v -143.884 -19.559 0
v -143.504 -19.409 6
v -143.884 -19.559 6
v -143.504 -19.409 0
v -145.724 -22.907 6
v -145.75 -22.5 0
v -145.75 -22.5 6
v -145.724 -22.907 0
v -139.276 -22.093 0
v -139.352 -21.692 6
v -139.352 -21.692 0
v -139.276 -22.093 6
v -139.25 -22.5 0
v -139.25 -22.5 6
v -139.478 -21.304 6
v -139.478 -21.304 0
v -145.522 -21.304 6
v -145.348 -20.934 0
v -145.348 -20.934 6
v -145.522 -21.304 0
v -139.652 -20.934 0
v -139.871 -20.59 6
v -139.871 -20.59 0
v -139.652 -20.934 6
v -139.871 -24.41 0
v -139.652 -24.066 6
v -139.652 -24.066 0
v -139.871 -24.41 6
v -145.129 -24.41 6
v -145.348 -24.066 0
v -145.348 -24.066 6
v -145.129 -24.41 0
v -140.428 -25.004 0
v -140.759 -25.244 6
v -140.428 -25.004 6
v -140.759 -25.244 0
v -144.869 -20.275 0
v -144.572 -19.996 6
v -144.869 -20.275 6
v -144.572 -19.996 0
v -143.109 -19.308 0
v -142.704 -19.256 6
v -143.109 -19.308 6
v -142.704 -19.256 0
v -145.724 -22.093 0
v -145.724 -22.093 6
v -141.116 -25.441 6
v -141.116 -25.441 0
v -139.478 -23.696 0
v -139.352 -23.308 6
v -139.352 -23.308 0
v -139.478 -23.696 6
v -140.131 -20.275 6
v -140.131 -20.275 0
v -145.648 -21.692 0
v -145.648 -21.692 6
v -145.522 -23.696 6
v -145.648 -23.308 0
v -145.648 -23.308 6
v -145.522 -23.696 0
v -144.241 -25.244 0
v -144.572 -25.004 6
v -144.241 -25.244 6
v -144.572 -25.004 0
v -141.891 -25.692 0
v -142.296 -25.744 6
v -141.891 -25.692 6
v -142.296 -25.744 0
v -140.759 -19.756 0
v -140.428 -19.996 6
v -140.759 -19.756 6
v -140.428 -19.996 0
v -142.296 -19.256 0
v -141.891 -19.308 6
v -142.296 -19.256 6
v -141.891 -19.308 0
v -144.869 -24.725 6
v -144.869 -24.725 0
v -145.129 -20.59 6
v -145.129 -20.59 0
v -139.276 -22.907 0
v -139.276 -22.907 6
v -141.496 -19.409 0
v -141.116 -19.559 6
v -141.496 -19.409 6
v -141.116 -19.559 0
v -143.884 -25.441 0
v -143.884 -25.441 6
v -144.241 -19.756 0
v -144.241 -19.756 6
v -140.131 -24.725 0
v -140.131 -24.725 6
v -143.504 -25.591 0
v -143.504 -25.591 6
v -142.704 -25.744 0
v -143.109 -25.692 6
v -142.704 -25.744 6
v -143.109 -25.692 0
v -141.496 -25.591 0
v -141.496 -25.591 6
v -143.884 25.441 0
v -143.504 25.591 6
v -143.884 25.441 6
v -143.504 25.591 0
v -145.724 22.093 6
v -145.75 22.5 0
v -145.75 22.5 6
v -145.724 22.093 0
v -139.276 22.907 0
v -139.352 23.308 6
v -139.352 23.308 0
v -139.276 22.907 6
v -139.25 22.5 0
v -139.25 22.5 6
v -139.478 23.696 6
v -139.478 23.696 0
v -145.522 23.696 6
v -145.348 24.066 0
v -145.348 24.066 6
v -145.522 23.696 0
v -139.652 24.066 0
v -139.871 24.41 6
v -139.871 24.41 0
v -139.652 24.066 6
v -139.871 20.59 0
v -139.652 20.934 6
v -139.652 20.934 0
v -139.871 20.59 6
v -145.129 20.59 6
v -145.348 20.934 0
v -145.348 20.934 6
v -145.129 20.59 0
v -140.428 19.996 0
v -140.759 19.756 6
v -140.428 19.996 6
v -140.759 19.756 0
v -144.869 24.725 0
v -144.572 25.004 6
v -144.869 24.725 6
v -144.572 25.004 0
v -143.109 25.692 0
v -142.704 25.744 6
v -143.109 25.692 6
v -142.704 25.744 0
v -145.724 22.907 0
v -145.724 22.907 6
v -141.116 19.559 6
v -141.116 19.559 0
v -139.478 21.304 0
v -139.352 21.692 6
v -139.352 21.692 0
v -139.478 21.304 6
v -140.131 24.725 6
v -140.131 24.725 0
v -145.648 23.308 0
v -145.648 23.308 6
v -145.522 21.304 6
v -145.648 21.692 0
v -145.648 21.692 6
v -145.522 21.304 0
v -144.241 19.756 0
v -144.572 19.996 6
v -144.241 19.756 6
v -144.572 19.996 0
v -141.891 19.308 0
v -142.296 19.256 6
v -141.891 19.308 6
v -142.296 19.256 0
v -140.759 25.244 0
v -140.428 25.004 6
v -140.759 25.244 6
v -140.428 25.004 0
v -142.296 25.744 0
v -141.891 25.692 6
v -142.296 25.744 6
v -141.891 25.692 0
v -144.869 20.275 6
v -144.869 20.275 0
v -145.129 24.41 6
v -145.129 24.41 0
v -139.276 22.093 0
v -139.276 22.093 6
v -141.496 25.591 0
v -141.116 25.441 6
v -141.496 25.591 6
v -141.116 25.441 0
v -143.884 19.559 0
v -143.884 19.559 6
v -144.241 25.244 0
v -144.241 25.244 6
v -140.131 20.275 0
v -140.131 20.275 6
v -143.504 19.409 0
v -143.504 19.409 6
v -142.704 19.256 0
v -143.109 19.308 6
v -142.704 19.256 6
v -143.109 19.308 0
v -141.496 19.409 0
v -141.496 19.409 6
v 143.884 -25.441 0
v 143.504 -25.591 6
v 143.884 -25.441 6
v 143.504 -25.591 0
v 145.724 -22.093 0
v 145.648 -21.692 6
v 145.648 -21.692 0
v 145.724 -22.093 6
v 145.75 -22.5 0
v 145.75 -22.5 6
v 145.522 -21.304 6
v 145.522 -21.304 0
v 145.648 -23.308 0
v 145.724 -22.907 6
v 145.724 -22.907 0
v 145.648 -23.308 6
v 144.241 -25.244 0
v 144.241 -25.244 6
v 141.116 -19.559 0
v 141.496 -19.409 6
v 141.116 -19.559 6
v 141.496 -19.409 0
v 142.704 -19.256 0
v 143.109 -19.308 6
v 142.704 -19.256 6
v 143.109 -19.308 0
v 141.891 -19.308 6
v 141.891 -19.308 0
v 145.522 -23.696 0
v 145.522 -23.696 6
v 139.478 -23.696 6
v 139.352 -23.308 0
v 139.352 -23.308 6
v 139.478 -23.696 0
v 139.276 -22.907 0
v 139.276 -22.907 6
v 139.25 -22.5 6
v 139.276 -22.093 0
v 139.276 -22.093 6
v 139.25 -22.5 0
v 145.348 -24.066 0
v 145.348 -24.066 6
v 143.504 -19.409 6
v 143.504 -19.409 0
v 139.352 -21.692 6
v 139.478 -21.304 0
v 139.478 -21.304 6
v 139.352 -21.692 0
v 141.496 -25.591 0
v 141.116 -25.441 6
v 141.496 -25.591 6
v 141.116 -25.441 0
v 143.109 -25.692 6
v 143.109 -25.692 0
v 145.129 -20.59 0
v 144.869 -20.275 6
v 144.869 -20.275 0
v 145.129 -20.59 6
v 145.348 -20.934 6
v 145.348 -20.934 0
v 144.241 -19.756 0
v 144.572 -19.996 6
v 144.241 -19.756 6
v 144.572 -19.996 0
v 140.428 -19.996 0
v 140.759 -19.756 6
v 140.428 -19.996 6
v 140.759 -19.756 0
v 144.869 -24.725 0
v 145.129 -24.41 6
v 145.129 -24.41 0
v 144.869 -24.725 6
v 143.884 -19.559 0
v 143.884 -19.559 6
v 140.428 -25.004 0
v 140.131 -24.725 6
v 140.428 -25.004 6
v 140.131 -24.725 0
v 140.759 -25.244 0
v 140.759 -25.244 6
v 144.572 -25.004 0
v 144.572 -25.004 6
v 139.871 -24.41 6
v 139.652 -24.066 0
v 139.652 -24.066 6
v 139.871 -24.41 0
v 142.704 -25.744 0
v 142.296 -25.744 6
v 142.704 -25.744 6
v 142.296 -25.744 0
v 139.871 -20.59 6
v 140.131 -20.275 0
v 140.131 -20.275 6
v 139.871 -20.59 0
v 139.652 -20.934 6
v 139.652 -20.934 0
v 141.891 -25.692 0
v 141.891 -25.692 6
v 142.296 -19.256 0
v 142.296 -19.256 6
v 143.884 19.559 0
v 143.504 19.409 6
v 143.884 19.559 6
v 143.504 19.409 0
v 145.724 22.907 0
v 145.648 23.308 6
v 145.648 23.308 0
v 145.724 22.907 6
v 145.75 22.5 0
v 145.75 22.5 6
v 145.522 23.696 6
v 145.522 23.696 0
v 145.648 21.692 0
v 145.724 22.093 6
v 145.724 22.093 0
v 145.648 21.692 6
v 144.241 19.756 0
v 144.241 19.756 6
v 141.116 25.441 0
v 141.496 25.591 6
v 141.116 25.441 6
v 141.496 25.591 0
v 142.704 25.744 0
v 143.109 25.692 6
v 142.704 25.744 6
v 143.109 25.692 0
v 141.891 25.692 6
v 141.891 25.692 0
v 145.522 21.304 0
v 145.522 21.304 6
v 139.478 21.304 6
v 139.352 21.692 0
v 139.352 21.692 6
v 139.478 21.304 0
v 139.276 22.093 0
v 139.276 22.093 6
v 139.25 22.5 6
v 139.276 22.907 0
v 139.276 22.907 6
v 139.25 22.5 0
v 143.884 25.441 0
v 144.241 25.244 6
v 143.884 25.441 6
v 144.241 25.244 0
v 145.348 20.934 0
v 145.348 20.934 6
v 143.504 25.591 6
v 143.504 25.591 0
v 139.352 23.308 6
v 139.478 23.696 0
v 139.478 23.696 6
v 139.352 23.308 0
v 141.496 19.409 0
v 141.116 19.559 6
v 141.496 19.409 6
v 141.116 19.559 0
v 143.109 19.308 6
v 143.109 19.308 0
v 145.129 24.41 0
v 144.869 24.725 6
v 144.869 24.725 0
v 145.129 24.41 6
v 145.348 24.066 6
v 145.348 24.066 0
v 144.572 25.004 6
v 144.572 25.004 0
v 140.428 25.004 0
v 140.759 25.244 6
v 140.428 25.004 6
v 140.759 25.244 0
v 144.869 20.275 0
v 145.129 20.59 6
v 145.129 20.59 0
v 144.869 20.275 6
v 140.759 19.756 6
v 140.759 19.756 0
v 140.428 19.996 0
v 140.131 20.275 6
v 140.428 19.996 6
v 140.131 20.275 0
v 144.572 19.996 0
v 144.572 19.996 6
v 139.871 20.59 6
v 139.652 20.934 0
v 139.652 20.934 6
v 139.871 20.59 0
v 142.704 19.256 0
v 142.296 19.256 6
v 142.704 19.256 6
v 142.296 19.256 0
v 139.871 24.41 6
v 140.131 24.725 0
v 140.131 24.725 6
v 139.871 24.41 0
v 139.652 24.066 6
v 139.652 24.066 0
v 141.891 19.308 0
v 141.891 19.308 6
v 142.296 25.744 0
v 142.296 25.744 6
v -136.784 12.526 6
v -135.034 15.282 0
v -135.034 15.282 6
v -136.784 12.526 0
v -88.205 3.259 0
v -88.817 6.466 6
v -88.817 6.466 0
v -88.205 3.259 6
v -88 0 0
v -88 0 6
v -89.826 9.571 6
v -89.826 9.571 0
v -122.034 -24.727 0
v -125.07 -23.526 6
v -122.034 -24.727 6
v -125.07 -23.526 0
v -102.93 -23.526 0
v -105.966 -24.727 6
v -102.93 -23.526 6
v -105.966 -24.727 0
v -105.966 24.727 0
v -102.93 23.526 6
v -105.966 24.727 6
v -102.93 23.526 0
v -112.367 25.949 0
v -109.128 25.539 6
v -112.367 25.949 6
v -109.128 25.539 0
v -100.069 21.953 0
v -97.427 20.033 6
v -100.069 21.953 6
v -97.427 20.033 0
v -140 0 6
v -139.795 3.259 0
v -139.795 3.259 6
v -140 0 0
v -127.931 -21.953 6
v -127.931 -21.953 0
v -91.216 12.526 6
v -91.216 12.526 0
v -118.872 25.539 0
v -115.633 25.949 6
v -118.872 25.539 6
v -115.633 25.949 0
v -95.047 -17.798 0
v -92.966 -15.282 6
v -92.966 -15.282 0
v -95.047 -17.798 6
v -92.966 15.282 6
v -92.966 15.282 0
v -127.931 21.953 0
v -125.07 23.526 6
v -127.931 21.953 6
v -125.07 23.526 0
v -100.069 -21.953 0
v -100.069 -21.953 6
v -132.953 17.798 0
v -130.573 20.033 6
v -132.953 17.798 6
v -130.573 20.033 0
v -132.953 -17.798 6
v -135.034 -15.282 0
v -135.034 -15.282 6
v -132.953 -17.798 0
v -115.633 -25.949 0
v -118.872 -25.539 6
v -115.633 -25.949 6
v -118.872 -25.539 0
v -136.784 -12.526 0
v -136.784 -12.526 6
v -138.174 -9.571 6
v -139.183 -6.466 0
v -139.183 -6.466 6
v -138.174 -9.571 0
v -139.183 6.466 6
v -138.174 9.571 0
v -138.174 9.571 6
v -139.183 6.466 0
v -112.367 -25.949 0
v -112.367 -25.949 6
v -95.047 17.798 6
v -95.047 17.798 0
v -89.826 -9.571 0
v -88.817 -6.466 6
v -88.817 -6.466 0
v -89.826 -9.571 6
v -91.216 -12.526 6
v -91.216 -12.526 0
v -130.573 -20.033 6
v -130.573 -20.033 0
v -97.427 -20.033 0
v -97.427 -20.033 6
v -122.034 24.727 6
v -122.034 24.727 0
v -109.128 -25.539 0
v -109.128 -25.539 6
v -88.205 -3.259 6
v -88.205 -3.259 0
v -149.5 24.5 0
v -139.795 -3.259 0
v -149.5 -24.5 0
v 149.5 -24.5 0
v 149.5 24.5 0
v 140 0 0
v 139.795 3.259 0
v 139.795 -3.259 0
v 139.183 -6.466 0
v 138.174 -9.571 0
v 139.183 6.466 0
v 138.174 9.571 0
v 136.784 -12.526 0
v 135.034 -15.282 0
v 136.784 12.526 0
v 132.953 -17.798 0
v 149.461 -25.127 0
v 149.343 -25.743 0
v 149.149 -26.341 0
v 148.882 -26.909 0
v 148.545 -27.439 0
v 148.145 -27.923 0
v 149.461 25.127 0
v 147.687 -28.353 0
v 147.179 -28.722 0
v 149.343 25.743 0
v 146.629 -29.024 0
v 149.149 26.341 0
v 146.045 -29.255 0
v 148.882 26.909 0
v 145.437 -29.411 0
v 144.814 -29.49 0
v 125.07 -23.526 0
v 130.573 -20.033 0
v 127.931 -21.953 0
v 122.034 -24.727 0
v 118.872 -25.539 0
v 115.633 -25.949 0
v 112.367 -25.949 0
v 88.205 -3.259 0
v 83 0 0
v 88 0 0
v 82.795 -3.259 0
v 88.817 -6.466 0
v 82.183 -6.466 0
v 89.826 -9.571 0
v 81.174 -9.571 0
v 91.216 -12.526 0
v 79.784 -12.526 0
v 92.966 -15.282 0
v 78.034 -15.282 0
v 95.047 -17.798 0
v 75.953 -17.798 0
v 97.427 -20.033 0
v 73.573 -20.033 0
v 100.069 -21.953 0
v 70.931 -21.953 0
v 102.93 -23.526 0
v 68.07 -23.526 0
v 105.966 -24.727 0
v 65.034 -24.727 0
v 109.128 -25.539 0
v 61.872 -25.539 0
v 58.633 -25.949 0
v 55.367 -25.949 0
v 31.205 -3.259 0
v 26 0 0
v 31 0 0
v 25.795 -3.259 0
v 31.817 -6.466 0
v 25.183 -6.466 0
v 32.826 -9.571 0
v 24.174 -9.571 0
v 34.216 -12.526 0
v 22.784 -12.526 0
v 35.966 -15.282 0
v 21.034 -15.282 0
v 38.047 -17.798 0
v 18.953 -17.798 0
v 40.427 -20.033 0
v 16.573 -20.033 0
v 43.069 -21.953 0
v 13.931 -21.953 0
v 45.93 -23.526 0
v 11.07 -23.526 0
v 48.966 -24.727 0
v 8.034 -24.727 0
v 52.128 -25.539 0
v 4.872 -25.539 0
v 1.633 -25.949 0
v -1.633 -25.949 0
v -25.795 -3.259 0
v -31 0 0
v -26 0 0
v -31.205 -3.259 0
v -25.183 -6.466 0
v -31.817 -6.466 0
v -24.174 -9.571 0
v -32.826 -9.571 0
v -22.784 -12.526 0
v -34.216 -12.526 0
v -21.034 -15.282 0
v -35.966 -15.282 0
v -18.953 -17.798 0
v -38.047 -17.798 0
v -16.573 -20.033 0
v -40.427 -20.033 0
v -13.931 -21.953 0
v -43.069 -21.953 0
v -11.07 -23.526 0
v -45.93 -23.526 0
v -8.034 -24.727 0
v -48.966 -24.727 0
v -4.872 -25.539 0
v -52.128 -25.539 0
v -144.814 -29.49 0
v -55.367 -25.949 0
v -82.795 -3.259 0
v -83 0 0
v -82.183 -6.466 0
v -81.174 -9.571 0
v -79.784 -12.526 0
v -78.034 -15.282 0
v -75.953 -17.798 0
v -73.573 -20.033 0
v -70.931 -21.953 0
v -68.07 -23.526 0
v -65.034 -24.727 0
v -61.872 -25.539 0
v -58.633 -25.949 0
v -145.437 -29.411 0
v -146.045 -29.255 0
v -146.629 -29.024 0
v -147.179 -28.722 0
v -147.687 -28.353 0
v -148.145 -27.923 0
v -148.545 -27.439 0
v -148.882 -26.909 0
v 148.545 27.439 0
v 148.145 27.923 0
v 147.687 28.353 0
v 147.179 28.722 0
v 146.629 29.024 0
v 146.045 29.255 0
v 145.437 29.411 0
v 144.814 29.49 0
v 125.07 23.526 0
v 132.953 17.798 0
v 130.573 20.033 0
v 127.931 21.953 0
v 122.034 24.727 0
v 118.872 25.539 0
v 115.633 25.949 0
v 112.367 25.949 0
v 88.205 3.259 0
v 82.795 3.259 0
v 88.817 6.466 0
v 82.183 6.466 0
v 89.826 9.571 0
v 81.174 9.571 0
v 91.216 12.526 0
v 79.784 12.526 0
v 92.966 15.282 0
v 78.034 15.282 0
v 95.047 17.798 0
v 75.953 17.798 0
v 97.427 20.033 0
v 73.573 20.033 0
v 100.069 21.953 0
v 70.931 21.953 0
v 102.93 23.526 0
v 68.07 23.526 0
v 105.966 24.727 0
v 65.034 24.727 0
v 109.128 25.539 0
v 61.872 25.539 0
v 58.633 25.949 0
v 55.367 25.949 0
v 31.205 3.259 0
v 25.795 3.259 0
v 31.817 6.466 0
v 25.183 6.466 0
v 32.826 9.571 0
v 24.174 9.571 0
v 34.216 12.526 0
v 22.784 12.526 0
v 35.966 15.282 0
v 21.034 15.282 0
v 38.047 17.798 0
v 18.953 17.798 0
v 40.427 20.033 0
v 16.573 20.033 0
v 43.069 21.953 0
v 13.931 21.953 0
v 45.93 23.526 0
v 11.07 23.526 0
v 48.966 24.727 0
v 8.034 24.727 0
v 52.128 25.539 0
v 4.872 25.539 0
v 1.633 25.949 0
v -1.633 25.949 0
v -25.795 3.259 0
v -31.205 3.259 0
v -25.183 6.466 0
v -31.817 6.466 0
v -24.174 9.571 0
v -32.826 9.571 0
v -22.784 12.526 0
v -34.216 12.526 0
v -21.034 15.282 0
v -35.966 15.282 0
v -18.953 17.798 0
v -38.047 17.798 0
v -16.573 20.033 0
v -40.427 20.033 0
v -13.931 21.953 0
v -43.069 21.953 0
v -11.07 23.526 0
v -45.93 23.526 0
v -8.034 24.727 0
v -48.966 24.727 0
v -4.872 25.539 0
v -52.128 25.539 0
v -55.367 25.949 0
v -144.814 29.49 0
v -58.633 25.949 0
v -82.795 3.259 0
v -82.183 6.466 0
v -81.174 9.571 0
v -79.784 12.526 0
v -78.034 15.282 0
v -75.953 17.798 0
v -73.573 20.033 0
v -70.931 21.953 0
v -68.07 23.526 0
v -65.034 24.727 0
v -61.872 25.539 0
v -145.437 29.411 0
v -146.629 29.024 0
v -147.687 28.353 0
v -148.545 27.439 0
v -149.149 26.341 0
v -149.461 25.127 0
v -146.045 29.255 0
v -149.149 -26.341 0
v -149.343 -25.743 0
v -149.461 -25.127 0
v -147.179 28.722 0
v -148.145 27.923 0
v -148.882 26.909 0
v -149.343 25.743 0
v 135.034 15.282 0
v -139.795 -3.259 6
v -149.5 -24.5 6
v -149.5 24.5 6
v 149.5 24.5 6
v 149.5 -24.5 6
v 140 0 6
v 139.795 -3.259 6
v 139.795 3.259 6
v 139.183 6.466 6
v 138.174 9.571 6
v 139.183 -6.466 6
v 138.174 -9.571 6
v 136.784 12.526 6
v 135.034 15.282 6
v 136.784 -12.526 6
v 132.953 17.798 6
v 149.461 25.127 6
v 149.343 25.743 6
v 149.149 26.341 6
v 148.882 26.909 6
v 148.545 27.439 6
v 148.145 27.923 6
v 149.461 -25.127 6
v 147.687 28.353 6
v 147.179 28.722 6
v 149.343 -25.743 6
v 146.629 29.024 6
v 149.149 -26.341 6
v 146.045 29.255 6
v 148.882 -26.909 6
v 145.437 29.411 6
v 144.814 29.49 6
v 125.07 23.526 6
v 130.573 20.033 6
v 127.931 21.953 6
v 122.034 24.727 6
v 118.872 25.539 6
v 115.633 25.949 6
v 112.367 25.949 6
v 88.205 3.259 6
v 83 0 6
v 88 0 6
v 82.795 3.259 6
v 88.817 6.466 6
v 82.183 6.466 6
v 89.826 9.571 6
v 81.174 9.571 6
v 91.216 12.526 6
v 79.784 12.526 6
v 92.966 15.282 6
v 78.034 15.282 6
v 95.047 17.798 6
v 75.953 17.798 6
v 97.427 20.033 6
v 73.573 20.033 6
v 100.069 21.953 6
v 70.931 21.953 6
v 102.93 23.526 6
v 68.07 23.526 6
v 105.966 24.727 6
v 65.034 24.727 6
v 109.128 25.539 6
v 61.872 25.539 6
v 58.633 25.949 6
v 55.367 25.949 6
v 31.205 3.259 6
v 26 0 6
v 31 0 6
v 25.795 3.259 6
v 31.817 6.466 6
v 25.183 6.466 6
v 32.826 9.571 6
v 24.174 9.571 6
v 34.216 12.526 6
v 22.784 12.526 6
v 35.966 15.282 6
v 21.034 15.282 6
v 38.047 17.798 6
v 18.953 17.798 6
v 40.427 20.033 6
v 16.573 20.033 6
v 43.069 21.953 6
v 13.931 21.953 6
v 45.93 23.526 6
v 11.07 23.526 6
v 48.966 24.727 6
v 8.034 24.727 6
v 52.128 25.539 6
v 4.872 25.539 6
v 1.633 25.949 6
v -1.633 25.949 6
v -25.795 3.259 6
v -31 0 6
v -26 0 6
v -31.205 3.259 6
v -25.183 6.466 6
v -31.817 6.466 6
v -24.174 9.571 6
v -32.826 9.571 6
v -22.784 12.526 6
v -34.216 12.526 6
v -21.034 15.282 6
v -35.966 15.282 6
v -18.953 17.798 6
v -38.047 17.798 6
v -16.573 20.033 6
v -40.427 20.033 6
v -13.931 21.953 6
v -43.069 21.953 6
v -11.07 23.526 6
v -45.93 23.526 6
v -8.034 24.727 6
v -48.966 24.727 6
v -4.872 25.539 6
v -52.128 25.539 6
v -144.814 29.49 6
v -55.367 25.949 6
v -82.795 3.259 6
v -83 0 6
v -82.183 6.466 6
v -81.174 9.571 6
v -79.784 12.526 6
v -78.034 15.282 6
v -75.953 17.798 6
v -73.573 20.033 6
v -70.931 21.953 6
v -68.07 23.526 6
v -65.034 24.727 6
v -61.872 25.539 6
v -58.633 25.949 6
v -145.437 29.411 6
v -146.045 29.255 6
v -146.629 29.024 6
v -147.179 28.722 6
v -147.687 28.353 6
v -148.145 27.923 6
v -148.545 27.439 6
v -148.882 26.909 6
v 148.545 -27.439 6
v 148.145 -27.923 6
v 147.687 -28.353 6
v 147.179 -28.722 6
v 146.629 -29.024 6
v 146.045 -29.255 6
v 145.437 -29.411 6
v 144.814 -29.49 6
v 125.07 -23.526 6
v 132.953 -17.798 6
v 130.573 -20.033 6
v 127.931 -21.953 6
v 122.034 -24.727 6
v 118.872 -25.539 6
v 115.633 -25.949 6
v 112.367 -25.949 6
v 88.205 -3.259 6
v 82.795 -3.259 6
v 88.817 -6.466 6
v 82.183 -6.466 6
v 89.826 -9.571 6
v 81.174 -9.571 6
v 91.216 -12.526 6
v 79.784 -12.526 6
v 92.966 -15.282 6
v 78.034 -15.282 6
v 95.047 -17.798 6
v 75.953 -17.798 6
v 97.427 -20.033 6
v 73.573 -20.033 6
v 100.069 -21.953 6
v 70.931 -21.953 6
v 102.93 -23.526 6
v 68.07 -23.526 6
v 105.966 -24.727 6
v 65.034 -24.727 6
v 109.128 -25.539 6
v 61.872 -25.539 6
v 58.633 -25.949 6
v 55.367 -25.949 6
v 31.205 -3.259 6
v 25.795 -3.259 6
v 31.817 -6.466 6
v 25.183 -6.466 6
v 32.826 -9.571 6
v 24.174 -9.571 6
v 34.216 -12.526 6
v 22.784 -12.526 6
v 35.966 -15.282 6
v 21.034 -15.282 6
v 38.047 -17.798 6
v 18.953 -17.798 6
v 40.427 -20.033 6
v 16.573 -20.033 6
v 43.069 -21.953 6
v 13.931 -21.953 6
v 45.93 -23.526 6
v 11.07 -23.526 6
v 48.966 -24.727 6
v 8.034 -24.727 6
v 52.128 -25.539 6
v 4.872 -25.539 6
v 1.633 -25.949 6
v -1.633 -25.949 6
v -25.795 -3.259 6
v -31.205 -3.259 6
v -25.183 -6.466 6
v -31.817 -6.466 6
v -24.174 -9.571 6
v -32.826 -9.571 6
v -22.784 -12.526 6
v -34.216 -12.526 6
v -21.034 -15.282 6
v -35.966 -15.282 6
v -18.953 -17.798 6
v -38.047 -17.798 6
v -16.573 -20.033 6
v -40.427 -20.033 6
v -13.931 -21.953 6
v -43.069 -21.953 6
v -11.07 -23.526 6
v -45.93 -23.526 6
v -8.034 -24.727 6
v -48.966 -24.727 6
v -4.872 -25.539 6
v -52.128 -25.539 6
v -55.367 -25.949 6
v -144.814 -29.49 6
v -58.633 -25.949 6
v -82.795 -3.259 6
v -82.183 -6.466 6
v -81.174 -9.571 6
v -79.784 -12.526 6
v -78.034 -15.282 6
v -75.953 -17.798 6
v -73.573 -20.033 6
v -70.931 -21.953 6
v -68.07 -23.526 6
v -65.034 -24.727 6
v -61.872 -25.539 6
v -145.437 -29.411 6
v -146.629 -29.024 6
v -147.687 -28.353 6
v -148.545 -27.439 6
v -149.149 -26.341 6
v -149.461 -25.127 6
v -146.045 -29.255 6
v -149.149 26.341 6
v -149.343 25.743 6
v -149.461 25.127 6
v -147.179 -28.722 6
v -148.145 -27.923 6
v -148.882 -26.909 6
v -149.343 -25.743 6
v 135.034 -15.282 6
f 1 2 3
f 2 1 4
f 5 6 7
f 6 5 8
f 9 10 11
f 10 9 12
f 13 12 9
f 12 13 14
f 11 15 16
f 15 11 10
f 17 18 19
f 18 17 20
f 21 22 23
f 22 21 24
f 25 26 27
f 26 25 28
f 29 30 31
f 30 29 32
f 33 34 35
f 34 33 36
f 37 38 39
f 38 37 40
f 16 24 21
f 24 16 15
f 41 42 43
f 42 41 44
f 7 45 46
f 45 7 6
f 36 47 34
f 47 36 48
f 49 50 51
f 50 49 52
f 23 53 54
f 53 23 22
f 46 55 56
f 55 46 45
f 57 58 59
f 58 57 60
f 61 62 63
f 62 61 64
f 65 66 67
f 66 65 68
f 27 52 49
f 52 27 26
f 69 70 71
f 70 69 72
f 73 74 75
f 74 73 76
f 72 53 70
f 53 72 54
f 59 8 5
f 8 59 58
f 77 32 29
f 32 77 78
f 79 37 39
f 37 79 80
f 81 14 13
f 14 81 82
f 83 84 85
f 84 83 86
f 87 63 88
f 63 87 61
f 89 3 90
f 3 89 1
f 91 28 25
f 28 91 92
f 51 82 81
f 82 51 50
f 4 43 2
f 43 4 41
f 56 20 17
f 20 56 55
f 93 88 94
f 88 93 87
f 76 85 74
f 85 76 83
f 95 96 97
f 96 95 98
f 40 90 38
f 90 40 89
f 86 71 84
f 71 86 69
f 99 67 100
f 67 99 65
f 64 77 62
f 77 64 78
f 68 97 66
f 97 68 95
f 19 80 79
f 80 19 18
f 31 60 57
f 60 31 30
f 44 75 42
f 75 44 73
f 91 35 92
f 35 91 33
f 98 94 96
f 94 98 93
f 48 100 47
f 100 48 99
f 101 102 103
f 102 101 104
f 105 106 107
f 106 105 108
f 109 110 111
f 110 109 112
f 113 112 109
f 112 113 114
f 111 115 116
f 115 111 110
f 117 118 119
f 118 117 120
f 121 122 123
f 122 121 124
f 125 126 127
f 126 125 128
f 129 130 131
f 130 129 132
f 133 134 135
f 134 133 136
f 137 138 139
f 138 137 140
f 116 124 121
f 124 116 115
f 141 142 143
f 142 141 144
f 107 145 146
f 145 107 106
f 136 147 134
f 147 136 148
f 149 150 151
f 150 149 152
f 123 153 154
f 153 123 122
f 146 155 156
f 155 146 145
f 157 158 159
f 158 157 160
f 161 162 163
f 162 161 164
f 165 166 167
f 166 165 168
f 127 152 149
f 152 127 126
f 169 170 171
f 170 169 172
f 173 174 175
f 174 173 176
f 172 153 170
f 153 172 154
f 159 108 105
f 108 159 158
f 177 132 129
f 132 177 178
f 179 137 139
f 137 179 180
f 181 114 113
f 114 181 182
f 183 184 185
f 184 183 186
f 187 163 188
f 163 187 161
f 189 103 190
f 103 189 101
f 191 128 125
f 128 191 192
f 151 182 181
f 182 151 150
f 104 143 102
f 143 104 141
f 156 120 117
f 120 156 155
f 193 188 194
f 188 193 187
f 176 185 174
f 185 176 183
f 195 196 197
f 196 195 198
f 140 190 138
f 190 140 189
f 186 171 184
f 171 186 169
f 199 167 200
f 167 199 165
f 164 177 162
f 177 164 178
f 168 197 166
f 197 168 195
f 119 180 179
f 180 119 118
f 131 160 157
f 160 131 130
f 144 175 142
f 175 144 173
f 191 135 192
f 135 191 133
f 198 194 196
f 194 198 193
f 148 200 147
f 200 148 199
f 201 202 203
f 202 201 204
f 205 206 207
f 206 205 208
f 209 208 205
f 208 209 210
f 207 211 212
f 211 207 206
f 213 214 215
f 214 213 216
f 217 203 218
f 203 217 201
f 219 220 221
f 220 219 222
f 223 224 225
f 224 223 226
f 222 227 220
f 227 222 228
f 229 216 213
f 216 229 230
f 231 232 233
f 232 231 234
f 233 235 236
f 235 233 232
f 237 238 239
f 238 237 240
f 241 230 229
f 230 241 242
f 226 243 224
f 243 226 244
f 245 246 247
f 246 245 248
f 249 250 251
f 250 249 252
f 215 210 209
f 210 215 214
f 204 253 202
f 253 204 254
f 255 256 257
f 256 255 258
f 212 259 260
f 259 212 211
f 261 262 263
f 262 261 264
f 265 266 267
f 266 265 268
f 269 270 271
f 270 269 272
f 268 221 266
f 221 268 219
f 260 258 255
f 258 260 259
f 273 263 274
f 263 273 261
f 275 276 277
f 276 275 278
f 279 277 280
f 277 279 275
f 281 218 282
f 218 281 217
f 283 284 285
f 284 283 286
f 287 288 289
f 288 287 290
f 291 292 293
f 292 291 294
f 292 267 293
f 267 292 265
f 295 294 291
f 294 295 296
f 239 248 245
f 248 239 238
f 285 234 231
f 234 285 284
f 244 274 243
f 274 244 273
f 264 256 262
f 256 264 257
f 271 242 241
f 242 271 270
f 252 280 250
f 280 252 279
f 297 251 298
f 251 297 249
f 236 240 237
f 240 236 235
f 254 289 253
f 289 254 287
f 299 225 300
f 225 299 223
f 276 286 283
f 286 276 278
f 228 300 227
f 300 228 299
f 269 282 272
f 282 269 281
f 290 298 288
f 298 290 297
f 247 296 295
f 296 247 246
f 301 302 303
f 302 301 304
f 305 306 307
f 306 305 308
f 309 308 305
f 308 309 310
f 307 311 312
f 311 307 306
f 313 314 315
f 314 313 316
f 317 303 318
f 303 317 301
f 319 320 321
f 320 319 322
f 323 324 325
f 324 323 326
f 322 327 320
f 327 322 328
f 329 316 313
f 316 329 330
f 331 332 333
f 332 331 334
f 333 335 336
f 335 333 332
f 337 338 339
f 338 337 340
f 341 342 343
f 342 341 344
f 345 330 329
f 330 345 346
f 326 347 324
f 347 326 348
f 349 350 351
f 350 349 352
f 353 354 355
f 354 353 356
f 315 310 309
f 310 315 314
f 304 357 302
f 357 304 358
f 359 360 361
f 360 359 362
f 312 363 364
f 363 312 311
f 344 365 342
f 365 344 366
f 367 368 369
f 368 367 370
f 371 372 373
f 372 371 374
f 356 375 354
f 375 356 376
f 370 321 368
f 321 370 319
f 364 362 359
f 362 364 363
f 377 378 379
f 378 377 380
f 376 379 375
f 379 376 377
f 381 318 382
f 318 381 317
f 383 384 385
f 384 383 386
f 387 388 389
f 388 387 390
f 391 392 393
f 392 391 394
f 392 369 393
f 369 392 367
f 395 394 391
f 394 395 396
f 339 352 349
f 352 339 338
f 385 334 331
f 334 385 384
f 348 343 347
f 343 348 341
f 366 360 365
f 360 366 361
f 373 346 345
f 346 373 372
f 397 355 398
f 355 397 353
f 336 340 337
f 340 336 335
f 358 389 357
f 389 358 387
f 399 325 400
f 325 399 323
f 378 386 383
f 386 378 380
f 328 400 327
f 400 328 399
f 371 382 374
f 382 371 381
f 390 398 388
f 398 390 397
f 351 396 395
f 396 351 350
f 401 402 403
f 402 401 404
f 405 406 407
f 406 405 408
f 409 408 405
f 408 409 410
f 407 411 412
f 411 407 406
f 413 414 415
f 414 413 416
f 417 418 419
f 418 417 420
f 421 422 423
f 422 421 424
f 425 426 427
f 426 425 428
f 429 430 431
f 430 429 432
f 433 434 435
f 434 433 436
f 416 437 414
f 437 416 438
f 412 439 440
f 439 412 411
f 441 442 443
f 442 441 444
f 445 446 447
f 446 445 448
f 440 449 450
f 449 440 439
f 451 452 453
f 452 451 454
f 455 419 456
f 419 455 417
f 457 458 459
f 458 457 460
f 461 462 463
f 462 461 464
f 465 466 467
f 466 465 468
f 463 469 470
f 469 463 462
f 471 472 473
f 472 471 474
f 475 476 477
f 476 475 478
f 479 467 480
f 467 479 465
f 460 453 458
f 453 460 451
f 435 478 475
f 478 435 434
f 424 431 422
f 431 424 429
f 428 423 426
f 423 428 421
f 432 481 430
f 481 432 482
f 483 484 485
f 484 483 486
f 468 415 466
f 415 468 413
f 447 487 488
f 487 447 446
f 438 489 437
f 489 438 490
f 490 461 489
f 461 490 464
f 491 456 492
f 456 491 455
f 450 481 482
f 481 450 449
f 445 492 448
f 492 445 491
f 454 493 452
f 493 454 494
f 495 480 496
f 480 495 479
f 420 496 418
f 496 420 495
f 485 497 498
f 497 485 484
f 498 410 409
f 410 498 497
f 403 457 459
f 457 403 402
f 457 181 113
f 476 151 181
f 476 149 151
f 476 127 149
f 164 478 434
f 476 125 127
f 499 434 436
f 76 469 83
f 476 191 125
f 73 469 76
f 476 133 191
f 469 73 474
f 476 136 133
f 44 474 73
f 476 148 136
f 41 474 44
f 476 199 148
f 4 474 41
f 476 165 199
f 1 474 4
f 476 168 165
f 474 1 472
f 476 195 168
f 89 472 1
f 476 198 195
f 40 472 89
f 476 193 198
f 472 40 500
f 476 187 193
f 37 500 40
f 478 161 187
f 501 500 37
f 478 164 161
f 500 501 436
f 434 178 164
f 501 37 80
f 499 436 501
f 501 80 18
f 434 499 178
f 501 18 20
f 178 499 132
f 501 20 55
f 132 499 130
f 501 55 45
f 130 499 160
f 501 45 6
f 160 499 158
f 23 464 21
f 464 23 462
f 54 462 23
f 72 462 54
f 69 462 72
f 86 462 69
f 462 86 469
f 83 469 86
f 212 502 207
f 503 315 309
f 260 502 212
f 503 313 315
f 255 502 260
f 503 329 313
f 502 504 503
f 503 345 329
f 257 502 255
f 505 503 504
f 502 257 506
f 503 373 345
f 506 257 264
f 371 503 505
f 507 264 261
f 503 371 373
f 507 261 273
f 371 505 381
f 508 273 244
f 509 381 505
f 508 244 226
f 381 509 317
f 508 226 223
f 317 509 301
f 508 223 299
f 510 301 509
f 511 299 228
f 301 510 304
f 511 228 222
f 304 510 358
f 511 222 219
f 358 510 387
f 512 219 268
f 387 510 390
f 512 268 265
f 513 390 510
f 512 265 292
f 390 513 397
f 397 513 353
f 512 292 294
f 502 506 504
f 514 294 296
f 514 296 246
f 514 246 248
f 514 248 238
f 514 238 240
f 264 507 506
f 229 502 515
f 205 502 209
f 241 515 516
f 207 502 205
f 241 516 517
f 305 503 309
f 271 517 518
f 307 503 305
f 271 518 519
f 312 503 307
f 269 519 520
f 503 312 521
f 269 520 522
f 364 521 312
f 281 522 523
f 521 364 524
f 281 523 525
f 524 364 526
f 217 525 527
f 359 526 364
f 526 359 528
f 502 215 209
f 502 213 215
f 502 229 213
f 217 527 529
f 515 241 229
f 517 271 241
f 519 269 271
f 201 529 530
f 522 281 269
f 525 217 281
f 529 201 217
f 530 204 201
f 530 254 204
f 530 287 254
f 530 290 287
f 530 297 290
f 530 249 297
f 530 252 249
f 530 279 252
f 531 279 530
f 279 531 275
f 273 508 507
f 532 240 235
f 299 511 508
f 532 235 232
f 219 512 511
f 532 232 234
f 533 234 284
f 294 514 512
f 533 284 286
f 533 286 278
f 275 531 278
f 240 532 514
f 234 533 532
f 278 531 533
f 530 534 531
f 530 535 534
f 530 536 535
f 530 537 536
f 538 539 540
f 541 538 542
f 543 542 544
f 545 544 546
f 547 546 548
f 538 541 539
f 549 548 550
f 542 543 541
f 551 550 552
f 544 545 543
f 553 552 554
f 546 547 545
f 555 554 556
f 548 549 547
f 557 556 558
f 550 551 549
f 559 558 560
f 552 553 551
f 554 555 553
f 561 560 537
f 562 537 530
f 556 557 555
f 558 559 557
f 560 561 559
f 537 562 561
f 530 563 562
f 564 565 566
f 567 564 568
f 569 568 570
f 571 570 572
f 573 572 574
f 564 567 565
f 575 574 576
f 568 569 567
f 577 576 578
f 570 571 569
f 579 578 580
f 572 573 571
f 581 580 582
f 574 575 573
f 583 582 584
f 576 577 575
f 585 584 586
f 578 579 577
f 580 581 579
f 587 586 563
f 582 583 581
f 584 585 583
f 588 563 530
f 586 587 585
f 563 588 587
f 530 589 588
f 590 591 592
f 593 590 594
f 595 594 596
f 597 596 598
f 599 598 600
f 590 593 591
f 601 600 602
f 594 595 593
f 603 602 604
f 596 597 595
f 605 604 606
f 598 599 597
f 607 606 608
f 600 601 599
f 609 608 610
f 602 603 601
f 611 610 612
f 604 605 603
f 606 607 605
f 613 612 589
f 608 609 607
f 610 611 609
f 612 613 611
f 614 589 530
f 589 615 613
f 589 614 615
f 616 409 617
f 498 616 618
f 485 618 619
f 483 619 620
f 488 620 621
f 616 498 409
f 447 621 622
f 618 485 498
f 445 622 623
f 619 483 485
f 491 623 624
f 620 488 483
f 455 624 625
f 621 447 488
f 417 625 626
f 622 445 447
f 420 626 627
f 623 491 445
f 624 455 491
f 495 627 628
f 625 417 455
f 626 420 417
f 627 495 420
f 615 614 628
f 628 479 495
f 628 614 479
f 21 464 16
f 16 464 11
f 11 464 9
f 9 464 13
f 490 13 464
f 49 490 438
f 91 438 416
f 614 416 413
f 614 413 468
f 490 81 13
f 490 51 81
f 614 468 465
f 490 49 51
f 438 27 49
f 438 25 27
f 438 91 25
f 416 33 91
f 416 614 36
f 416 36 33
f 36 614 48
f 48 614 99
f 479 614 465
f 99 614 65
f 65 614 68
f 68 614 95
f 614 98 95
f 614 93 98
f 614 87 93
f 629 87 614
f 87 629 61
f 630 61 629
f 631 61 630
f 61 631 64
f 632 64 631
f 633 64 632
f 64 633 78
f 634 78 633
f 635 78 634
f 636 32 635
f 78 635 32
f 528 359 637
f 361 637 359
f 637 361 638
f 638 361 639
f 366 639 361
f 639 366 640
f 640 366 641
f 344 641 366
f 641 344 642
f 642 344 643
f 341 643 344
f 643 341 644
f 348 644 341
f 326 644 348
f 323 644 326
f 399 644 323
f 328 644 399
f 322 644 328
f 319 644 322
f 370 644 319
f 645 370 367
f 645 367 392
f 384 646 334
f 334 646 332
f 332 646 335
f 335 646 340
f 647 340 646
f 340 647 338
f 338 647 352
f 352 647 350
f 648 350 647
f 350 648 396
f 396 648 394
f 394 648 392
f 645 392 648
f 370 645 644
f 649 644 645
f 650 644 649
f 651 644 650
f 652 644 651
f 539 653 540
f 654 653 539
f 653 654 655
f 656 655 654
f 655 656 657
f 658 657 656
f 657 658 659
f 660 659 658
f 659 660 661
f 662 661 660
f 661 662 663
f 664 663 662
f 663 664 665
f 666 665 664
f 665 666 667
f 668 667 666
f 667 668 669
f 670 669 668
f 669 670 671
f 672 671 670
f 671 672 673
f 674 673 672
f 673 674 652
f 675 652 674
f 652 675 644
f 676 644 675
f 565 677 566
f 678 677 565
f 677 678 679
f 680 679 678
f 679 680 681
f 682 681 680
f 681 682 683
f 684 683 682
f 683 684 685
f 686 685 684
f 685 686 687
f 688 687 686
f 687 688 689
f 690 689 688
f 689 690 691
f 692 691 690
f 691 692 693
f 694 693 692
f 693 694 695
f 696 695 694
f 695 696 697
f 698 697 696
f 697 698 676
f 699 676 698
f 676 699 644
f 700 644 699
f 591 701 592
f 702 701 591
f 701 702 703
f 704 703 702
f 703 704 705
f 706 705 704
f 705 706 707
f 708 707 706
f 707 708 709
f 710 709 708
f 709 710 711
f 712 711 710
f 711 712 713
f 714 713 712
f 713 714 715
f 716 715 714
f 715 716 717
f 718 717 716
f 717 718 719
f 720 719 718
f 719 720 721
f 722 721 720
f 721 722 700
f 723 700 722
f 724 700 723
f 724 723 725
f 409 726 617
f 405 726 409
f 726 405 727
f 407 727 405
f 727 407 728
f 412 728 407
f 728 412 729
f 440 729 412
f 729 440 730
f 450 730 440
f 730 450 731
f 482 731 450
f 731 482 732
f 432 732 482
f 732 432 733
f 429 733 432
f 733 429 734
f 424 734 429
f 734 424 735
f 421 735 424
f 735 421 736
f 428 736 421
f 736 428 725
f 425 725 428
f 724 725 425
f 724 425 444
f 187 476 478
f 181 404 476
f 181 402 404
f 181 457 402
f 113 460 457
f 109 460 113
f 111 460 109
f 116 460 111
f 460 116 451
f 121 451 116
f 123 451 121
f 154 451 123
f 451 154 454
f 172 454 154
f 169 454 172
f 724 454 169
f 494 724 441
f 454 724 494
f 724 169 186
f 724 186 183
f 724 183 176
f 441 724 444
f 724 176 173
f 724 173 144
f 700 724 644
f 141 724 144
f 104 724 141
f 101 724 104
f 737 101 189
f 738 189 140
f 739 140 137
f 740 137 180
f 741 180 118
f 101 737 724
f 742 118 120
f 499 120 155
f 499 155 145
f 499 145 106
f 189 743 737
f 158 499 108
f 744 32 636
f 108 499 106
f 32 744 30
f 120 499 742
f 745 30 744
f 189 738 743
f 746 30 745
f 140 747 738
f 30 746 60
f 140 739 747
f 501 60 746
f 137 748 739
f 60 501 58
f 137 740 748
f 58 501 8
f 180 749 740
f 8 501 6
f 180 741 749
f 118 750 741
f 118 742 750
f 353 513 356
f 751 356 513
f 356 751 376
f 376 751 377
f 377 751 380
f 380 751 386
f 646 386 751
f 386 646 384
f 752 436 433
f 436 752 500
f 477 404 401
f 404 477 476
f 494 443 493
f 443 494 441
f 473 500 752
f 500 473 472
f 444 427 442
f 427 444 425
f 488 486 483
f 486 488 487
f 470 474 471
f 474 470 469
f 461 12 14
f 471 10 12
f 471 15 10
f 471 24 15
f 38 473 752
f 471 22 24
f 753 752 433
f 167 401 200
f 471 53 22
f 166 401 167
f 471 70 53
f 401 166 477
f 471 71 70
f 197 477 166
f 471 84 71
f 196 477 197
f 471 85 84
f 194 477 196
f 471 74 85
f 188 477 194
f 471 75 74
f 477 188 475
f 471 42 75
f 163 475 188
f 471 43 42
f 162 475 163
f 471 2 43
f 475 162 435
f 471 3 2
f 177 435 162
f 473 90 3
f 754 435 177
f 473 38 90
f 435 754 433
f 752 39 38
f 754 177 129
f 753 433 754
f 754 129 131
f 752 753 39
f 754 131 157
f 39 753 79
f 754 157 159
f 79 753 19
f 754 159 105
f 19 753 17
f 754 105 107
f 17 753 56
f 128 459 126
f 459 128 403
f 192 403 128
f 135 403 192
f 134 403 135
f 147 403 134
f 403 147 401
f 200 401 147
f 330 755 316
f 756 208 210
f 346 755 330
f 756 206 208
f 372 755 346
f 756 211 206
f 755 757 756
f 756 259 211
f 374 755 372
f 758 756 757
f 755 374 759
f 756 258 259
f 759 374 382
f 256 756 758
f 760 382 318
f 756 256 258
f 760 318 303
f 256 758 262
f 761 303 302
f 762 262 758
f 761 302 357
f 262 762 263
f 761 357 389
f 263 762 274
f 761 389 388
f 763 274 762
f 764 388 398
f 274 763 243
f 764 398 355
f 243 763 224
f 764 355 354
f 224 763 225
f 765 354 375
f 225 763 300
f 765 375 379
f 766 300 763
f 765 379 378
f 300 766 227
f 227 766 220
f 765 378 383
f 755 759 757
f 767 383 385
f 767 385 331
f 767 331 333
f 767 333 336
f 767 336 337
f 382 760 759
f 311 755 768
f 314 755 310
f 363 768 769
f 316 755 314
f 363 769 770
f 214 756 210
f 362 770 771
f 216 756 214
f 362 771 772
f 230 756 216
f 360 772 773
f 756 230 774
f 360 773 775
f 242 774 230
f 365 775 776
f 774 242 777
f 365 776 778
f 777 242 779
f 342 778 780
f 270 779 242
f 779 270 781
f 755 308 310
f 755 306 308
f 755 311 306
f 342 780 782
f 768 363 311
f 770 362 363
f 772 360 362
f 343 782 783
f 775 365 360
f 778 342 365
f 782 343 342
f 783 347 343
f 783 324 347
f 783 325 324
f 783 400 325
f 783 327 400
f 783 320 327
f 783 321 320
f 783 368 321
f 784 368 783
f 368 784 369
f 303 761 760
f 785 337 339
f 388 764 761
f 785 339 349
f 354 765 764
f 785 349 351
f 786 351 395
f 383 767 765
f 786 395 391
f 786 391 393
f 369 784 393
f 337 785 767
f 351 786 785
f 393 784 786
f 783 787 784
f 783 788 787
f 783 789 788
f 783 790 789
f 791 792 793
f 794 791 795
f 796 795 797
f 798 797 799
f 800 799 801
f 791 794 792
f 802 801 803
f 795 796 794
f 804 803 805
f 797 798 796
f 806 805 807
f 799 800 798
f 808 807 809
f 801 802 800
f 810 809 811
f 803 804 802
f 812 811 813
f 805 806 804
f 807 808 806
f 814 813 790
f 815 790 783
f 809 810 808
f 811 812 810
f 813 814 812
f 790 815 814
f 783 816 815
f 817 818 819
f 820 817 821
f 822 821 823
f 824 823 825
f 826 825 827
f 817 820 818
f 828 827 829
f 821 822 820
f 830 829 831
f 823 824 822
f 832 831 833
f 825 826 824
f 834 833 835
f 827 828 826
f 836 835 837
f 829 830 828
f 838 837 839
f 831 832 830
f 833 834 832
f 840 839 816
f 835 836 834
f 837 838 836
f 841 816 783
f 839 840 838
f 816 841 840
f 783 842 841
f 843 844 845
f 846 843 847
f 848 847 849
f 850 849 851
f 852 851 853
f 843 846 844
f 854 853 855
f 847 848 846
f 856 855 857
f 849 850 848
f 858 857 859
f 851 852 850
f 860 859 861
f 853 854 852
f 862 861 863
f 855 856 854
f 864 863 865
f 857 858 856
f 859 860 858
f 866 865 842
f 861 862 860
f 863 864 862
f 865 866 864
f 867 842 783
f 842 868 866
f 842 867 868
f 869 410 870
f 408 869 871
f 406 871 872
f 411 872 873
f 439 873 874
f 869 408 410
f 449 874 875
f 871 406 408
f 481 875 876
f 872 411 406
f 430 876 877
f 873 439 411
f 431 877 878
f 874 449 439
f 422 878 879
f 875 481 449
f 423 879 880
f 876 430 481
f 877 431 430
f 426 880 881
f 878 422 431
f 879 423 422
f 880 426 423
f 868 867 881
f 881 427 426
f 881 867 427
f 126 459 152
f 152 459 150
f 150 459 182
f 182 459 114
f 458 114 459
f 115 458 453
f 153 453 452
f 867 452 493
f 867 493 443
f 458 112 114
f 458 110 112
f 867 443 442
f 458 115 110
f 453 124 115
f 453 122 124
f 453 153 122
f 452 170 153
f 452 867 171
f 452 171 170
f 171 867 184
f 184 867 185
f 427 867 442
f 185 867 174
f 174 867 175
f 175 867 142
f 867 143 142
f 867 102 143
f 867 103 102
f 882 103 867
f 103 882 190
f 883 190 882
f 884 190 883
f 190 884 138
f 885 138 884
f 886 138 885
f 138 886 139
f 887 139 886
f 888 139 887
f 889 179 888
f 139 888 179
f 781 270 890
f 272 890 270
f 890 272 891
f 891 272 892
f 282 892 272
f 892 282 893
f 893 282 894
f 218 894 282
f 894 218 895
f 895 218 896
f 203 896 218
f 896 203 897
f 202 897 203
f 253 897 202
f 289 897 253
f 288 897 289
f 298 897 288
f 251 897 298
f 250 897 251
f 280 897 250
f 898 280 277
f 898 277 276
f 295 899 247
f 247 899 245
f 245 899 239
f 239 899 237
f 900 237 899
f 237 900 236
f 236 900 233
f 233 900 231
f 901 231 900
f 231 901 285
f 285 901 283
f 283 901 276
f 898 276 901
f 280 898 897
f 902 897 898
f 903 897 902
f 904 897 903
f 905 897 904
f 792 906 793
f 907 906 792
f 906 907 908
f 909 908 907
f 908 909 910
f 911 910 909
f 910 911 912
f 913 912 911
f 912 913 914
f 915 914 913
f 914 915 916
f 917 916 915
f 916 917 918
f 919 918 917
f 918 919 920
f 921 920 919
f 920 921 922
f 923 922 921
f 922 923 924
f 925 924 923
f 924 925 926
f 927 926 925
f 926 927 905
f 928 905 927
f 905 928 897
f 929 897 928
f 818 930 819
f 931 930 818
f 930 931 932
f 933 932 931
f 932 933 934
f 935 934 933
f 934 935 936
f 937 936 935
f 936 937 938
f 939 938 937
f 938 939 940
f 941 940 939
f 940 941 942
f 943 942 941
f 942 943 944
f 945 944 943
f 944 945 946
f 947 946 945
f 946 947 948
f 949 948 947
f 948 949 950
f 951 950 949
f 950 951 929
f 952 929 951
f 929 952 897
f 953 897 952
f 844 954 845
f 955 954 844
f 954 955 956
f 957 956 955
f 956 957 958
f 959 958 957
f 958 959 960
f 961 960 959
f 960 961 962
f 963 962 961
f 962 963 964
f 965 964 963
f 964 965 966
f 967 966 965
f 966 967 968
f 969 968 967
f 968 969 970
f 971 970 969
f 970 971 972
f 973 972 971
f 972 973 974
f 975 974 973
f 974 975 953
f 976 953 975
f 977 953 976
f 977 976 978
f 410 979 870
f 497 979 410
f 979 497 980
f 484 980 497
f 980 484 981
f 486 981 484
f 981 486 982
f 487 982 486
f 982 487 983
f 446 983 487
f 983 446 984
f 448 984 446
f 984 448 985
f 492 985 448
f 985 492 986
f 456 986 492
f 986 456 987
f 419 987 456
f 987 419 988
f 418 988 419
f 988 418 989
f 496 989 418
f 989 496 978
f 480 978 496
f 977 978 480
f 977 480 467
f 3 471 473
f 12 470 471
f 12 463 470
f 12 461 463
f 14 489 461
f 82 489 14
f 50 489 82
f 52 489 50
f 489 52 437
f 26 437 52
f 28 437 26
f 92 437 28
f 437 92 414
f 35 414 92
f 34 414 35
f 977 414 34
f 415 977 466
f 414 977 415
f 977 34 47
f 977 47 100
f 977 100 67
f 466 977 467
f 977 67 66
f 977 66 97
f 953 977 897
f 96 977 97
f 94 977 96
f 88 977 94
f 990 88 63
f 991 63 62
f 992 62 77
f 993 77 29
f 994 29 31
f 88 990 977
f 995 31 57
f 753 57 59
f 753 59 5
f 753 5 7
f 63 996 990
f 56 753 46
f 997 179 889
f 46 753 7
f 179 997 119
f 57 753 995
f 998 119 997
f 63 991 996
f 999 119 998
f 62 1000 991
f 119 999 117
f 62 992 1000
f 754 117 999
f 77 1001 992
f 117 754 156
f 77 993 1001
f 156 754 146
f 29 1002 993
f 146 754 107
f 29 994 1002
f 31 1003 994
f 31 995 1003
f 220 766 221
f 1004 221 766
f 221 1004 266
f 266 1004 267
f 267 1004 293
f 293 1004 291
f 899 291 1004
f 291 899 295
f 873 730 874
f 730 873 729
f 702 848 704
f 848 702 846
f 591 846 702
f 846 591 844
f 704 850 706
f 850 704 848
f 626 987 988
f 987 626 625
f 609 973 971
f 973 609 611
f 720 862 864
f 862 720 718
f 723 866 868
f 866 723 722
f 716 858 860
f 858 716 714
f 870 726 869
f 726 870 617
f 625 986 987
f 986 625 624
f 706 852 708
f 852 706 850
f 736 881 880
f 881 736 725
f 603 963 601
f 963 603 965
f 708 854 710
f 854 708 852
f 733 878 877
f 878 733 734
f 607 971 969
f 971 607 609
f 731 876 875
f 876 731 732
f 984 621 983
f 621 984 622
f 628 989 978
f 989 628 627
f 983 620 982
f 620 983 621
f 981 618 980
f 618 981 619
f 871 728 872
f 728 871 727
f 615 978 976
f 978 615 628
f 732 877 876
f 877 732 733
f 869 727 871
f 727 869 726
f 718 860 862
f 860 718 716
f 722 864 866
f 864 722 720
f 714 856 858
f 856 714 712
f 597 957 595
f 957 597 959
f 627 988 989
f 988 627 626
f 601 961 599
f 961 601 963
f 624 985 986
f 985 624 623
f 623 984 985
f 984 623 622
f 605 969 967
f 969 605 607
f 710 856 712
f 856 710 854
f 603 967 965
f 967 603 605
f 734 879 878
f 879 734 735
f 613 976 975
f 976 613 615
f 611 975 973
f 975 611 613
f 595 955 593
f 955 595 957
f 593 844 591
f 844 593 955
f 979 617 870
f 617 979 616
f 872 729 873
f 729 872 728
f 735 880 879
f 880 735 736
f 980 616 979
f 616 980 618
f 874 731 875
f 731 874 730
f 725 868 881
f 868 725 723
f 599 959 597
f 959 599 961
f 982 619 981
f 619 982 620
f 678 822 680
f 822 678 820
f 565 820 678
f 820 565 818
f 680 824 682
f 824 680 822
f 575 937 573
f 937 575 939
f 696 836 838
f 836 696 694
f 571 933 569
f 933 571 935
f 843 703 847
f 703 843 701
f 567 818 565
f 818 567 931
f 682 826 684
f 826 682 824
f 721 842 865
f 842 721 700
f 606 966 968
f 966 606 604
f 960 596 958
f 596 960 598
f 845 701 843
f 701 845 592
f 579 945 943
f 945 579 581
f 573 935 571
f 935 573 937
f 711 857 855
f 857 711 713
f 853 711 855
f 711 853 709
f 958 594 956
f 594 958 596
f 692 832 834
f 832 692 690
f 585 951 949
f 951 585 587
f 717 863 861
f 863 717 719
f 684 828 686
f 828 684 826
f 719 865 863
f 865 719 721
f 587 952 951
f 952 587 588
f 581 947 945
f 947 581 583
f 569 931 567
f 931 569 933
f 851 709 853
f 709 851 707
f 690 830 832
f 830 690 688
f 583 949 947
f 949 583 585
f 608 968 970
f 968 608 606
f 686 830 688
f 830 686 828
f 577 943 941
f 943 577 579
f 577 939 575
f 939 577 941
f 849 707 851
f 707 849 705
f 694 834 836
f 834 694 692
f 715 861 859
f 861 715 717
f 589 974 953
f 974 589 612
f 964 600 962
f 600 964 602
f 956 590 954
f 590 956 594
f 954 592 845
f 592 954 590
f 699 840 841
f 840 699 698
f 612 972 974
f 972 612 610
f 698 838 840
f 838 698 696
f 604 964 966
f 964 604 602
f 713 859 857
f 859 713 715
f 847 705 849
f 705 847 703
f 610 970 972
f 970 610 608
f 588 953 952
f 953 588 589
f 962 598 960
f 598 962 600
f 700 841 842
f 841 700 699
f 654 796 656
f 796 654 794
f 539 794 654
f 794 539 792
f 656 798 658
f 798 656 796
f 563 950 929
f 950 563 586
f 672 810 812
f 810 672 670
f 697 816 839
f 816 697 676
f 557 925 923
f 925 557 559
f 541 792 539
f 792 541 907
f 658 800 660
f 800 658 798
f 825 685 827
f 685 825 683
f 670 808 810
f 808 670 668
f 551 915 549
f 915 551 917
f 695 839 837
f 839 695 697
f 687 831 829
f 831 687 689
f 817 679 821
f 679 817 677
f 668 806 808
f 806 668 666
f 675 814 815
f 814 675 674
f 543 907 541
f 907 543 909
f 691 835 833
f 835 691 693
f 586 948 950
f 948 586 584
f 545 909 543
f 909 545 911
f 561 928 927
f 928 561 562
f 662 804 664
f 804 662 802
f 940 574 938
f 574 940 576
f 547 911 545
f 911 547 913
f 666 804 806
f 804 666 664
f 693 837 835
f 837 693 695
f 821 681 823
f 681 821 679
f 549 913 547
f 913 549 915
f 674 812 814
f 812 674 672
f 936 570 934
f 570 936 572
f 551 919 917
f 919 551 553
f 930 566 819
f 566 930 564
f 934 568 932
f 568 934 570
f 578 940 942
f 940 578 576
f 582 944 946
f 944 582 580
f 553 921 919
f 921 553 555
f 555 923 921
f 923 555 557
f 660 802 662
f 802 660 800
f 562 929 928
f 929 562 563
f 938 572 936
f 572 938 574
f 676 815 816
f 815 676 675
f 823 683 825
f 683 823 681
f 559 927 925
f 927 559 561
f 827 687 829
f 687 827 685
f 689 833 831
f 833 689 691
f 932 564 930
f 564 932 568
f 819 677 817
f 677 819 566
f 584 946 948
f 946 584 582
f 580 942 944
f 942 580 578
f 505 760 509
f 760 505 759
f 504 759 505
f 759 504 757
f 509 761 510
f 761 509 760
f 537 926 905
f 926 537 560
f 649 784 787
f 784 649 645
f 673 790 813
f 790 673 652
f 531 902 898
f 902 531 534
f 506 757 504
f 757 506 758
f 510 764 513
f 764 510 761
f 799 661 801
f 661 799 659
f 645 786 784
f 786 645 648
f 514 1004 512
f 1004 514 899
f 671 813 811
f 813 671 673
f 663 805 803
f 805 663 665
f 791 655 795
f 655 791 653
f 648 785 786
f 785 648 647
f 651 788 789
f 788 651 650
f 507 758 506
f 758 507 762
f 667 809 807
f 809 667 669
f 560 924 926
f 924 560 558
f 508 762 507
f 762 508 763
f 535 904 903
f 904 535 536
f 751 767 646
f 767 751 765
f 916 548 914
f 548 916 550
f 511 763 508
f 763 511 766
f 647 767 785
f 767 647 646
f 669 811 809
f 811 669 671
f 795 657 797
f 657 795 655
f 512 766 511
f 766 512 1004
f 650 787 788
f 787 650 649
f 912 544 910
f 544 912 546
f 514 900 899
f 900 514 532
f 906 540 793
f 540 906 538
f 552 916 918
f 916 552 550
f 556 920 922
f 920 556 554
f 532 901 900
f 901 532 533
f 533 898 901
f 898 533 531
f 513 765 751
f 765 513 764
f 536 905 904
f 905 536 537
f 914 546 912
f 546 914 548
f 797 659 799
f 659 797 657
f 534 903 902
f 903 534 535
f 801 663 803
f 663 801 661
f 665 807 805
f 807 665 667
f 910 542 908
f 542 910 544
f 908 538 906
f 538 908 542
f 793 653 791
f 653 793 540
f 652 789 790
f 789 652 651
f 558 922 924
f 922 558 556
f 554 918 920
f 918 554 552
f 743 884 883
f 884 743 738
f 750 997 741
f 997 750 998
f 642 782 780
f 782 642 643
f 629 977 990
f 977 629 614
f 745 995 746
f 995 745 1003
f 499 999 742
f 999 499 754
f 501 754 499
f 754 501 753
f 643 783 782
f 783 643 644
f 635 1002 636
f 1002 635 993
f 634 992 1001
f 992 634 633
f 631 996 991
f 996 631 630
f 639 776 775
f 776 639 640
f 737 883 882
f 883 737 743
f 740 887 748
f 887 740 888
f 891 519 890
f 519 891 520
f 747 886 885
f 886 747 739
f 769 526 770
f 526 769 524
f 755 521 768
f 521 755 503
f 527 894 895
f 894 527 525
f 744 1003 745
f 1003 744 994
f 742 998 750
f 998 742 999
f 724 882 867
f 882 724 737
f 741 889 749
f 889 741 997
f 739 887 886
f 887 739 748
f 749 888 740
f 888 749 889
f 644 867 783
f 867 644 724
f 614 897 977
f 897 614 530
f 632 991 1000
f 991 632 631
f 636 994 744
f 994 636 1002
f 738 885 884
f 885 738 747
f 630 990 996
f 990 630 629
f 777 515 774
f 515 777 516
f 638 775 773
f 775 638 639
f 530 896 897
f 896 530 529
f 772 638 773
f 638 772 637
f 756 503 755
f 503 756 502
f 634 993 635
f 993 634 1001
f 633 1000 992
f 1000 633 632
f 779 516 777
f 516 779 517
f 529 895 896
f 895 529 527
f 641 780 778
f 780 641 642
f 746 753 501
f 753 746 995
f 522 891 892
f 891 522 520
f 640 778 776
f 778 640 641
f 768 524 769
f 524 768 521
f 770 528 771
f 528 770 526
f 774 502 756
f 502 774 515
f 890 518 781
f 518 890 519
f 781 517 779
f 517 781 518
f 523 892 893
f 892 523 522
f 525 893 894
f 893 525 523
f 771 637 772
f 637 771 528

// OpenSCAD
$fn = 50;


difference() {
	union() {
		hull() {
			translate(v = [-144.5000000000, 24.5000000000, 0]) {
				cylinder(h = 6, r = 5);
			}
			translate(v = [144.5000000000, 24.5000000000, 0]) {
				cylinder(h = 6, r = 5);
			}
			translate(v = [-144.5000000000, -24.5000000000, 0]) {
				cylinder(h = 6, r = 5);
			}
			translate(v = [144.5000000000, -24.5000000000, 0]) {
				cylinder(h = 6, r = 5);
			}
		}
	}
	union() {
		#translate(v = [-142.5000000000, -22.5000000000, -100.0000000000]) {
			cylinder(h = 200, r = 3.2500000000);
		}
		#translate(v = [-142.5000000000, 22.5000000000, -100.0000000000]) {
			cylinder(h = 200, r = 3.2500000000);
		}
		#translate(v = [142.5000000000, -22.5000000000, -100.0000000000]) {
			cylinder(h = 200, r = 3.2500000000);
		}
		#translate(v = [142.5000000000, 22.5000000000, -100.0000000000]) {
			cylinder(h = 200, r = 3.2500000000);
		}
		#translate(v = [-114.0000000000, 0, 0]) {
			cylinder(h = 6, r = 26.0000000000);
		}
		#translate(v = [-57.0000000000, 0, 0]) {
			cylinder(h = 6, r = 26.0000000000);
		}
		#cylinder(h = 6, r = 26.0000000000);
		#translate(v = [57.0000000000, 0, 0]) {
			cylinder(h = 6, r = 26.0000000000);
		}
		#translate(v = [114.0000000000, 0, 0]) {
			cylinder(h = 6, r = 26.0000000000);
		}
	}
}
